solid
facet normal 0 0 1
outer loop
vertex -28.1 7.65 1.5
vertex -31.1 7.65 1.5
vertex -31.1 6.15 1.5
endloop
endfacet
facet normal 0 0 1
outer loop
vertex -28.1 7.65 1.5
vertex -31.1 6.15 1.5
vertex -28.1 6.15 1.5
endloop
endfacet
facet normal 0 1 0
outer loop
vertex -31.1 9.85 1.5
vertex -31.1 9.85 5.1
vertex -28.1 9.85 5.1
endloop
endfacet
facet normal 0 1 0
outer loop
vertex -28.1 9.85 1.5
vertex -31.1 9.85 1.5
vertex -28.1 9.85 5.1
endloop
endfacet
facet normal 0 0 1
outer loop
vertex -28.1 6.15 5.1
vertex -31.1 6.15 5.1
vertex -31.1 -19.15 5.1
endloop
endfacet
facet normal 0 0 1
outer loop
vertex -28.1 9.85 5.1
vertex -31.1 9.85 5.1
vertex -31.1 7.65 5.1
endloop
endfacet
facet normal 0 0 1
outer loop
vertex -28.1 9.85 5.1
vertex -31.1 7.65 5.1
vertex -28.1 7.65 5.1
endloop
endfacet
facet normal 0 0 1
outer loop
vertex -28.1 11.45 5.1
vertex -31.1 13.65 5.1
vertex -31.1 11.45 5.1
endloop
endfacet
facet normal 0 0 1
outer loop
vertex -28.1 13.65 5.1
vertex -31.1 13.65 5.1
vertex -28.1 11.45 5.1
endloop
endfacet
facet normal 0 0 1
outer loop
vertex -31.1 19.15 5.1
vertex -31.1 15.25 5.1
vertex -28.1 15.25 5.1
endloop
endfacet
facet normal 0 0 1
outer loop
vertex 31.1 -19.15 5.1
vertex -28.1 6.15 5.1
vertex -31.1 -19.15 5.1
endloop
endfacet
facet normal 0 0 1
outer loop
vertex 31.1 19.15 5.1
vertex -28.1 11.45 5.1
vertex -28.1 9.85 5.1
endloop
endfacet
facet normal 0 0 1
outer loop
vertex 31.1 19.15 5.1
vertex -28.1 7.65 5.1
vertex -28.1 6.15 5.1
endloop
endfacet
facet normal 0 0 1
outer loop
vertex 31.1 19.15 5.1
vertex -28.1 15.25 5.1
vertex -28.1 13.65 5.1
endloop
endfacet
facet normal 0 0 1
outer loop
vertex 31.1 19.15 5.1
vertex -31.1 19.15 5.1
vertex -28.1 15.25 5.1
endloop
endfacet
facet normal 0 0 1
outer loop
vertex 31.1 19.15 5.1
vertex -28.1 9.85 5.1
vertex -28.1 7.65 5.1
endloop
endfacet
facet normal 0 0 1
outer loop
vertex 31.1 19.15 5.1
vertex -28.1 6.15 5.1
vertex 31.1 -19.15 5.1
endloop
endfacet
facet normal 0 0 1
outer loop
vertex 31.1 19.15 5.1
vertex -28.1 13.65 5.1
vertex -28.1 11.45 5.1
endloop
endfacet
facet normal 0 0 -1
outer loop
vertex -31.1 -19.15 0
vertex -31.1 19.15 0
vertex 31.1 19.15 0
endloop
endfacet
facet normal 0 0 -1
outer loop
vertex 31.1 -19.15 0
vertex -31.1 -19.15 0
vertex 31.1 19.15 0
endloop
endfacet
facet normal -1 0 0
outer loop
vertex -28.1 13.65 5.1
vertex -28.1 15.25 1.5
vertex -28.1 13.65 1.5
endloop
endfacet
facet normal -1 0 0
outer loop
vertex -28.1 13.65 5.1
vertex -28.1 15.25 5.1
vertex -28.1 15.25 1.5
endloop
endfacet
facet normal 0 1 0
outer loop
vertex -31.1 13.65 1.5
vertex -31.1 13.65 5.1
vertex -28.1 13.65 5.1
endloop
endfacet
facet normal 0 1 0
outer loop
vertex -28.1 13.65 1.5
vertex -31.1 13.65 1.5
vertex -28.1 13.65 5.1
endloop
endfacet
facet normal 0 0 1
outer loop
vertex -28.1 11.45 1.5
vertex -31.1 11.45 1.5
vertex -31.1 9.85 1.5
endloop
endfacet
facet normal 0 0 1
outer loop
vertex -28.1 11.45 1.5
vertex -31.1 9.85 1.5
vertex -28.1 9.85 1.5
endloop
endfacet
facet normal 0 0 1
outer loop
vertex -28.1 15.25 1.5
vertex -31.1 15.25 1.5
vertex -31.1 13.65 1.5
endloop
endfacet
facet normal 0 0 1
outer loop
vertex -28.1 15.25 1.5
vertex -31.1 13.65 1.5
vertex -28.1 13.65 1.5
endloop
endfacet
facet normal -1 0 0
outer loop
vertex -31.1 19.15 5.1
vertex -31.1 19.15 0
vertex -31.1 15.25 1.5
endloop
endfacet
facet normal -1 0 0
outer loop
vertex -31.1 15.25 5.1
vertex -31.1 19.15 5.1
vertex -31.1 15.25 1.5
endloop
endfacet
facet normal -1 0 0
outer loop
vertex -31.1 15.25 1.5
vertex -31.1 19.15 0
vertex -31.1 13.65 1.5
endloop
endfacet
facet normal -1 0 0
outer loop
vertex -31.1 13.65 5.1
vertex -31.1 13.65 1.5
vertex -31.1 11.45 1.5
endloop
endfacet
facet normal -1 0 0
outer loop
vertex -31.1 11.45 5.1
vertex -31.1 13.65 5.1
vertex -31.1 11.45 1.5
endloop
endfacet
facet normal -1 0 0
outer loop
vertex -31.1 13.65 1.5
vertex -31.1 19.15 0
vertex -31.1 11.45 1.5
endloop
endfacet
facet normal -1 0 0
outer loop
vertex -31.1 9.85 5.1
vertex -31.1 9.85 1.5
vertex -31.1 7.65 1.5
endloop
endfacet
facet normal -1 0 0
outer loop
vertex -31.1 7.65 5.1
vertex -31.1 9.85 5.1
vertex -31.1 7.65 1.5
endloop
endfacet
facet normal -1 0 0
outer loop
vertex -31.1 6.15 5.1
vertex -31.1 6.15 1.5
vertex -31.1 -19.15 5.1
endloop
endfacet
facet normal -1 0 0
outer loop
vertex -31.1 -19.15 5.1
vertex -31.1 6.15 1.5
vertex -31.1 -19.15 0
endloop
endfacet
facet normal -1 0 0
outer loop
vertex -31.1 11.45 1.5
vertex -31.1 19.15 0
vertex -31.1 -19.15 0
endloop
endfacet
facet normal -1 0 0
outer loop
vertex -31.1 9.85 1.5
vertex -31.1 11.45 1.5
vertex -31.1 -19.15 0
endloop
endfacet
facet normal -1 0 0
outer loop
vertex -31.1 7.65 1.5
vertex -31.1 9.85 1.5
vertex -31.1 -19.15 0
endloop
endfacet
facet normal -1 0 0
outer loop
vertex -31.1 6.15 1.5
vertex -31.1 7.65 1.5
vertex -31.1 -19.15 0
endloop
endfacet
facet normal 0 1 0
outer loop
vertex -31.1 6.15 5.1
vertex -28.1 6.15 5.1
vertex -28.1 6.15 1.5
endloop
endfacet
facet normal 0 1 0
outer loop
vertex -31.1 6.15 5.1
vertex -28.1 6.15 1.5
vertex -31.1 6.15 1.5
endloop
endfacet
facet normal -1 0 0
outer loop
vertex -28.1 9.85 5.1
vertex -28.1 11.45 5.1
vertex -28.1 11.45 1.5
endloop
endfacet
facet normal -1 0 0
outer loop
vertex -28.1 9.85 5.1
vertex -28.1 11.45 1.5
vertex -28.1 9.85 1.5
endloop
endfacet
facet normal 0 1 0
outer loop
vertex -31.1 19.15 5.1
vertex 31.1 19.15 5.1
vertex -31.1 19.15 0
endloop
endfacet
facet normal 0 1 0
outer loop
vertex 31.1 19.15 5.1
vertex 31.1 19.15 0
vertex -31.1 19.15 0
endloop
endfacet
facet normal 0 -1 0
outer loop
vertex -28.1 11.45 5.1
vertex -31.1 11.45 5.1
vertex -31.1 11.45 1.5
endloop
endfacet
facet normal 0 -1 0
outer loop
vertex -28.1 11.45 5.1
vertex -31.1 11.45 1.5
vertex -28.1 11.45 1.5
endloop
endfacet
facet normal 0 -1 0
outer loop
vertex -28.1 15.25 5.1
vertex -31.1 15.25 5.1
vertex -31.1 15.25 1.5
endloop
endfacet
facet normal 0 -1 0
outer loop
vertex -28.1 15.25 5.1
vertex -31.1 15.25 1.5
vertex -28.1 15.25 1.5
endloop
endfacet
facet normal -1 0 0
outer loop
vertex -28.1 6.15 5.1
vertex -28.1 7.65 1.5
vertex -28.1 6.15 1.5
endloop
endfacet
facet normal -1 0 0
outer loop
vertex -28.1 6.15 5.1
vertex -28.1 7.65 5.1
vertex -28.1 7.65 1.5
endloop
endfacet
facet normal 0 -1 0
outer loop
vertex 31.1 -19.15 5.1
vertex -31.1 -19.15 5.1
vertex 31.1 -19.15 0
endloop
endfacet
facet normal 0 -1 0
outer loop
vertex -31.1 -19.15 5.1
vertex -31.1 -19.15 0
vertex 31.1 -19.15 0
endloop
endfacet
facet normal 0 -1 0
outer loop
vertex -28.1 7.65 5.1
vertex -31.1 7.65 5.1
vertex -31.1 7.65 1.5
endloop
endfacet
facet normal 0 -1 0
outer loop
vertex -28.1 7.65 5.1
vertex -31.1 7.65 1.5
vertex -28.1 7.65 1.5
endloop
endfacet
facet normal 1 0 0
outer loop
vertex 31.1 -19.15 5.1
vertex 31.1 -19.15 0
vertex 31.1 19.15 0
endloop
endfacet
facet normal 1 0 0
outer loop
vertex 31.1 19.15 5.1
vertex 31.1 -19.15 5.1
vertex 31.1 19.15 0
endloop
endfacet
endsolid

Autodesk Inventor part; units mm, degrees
ref_plane "YZ Plane" through (0, 0, 0) normal (1, 0, 0) x (0, 1, 0)
ref_plane "XZ Plane" through (0, 0, 0) normal (0, 1, 0) x (-1, 0, 0)
ref_plane "XY Plane" through (0, 0, 0) normal (0, 0, 1) x (1, 0, 0)
sketch "Sketch1" plane through (0, 0, 0) normal (0, 0, 1) x (1, 0, 0)
  line L0 (-31.1, -19.15) -> (31.1, -19.15)
  line L1 (31.1, -19.15) -> (31.1, 19.15)
  line L2 (31.1, 19.15) -> (-31.1, 19.15)
  line L3 (-31.1, 19.15) -> (-31.1, -19.15)
  line L4 (-31.1, -19.15) -> (31.1, 19.15) construction
  line L5 (31.1, -19.15) -> (-31.1, 19.15) construction
  point P0 (0, 0)
  dimension "d0" = 38.3
  dimension "d1" = 62.2
extrude "Extrusion1" add sketch "Sketch1" along normal blind 5.1
sketch "Sketch2" plane through (0, 0, 5.1) normal (0, 0, 1) x (1, 0, 0)
  line L0 (-31.1, 19.15) -> (-28.1, 19.15)
  line L1 (-28.1, 19.15) -> (-28.1, 6.15)
  line L2 (-28.1, 6.15) -> (-31.1, 6.15)
  line L3 (-31.1, 6.15) -> (-31.1, 19.15)
  line L4 (-31.1, 19.15) -> (-31.1, 15.25)
  line L5 (-31.1, 19.15) -> (-31.1, -19.15) projected
  line L6 (-31.1, 15.25) -> (-28.1, 15.25)
  line L7 (-31.1, 15.25) -> (-31.1, 13.65)
  line L8 (-31.1, 13.65) -> (-28.1, 13.65)
  line L9 (-31.1, 13.65) -> (-31.1, 11.45)
  line L10 (-31.1, 11.45) -> (-28.1, 11.45)
  line L11 (-31.1, 11.45) -> (-31.1, 9.85)
  line L12 (-31.1, 9.85) -> (-28.1, 9.85)
  line L13 (-31.1, 9.85) -> (-31.1, 7.65)
  line L14 (-31.1, 7.65) -> (-28.1, 7.65)
  point P0 (0, 0)
  dimension "d4" = 13
  dimension "d5" = 3
  dimension "d6" = 3.9
  dimension "d7" = 1.6
  dimension "d8" = 2.2
  dimension "d9" = 1.6
  dimension "d10" = 2.2
extrude "Extrusion2" cut sketch "Sketch2" against normal blind 3.6 contours L6 L1 L8 L3 | L10 L1 L12 L3 | L14 L1 L2 L3
properties part number "bateria"
